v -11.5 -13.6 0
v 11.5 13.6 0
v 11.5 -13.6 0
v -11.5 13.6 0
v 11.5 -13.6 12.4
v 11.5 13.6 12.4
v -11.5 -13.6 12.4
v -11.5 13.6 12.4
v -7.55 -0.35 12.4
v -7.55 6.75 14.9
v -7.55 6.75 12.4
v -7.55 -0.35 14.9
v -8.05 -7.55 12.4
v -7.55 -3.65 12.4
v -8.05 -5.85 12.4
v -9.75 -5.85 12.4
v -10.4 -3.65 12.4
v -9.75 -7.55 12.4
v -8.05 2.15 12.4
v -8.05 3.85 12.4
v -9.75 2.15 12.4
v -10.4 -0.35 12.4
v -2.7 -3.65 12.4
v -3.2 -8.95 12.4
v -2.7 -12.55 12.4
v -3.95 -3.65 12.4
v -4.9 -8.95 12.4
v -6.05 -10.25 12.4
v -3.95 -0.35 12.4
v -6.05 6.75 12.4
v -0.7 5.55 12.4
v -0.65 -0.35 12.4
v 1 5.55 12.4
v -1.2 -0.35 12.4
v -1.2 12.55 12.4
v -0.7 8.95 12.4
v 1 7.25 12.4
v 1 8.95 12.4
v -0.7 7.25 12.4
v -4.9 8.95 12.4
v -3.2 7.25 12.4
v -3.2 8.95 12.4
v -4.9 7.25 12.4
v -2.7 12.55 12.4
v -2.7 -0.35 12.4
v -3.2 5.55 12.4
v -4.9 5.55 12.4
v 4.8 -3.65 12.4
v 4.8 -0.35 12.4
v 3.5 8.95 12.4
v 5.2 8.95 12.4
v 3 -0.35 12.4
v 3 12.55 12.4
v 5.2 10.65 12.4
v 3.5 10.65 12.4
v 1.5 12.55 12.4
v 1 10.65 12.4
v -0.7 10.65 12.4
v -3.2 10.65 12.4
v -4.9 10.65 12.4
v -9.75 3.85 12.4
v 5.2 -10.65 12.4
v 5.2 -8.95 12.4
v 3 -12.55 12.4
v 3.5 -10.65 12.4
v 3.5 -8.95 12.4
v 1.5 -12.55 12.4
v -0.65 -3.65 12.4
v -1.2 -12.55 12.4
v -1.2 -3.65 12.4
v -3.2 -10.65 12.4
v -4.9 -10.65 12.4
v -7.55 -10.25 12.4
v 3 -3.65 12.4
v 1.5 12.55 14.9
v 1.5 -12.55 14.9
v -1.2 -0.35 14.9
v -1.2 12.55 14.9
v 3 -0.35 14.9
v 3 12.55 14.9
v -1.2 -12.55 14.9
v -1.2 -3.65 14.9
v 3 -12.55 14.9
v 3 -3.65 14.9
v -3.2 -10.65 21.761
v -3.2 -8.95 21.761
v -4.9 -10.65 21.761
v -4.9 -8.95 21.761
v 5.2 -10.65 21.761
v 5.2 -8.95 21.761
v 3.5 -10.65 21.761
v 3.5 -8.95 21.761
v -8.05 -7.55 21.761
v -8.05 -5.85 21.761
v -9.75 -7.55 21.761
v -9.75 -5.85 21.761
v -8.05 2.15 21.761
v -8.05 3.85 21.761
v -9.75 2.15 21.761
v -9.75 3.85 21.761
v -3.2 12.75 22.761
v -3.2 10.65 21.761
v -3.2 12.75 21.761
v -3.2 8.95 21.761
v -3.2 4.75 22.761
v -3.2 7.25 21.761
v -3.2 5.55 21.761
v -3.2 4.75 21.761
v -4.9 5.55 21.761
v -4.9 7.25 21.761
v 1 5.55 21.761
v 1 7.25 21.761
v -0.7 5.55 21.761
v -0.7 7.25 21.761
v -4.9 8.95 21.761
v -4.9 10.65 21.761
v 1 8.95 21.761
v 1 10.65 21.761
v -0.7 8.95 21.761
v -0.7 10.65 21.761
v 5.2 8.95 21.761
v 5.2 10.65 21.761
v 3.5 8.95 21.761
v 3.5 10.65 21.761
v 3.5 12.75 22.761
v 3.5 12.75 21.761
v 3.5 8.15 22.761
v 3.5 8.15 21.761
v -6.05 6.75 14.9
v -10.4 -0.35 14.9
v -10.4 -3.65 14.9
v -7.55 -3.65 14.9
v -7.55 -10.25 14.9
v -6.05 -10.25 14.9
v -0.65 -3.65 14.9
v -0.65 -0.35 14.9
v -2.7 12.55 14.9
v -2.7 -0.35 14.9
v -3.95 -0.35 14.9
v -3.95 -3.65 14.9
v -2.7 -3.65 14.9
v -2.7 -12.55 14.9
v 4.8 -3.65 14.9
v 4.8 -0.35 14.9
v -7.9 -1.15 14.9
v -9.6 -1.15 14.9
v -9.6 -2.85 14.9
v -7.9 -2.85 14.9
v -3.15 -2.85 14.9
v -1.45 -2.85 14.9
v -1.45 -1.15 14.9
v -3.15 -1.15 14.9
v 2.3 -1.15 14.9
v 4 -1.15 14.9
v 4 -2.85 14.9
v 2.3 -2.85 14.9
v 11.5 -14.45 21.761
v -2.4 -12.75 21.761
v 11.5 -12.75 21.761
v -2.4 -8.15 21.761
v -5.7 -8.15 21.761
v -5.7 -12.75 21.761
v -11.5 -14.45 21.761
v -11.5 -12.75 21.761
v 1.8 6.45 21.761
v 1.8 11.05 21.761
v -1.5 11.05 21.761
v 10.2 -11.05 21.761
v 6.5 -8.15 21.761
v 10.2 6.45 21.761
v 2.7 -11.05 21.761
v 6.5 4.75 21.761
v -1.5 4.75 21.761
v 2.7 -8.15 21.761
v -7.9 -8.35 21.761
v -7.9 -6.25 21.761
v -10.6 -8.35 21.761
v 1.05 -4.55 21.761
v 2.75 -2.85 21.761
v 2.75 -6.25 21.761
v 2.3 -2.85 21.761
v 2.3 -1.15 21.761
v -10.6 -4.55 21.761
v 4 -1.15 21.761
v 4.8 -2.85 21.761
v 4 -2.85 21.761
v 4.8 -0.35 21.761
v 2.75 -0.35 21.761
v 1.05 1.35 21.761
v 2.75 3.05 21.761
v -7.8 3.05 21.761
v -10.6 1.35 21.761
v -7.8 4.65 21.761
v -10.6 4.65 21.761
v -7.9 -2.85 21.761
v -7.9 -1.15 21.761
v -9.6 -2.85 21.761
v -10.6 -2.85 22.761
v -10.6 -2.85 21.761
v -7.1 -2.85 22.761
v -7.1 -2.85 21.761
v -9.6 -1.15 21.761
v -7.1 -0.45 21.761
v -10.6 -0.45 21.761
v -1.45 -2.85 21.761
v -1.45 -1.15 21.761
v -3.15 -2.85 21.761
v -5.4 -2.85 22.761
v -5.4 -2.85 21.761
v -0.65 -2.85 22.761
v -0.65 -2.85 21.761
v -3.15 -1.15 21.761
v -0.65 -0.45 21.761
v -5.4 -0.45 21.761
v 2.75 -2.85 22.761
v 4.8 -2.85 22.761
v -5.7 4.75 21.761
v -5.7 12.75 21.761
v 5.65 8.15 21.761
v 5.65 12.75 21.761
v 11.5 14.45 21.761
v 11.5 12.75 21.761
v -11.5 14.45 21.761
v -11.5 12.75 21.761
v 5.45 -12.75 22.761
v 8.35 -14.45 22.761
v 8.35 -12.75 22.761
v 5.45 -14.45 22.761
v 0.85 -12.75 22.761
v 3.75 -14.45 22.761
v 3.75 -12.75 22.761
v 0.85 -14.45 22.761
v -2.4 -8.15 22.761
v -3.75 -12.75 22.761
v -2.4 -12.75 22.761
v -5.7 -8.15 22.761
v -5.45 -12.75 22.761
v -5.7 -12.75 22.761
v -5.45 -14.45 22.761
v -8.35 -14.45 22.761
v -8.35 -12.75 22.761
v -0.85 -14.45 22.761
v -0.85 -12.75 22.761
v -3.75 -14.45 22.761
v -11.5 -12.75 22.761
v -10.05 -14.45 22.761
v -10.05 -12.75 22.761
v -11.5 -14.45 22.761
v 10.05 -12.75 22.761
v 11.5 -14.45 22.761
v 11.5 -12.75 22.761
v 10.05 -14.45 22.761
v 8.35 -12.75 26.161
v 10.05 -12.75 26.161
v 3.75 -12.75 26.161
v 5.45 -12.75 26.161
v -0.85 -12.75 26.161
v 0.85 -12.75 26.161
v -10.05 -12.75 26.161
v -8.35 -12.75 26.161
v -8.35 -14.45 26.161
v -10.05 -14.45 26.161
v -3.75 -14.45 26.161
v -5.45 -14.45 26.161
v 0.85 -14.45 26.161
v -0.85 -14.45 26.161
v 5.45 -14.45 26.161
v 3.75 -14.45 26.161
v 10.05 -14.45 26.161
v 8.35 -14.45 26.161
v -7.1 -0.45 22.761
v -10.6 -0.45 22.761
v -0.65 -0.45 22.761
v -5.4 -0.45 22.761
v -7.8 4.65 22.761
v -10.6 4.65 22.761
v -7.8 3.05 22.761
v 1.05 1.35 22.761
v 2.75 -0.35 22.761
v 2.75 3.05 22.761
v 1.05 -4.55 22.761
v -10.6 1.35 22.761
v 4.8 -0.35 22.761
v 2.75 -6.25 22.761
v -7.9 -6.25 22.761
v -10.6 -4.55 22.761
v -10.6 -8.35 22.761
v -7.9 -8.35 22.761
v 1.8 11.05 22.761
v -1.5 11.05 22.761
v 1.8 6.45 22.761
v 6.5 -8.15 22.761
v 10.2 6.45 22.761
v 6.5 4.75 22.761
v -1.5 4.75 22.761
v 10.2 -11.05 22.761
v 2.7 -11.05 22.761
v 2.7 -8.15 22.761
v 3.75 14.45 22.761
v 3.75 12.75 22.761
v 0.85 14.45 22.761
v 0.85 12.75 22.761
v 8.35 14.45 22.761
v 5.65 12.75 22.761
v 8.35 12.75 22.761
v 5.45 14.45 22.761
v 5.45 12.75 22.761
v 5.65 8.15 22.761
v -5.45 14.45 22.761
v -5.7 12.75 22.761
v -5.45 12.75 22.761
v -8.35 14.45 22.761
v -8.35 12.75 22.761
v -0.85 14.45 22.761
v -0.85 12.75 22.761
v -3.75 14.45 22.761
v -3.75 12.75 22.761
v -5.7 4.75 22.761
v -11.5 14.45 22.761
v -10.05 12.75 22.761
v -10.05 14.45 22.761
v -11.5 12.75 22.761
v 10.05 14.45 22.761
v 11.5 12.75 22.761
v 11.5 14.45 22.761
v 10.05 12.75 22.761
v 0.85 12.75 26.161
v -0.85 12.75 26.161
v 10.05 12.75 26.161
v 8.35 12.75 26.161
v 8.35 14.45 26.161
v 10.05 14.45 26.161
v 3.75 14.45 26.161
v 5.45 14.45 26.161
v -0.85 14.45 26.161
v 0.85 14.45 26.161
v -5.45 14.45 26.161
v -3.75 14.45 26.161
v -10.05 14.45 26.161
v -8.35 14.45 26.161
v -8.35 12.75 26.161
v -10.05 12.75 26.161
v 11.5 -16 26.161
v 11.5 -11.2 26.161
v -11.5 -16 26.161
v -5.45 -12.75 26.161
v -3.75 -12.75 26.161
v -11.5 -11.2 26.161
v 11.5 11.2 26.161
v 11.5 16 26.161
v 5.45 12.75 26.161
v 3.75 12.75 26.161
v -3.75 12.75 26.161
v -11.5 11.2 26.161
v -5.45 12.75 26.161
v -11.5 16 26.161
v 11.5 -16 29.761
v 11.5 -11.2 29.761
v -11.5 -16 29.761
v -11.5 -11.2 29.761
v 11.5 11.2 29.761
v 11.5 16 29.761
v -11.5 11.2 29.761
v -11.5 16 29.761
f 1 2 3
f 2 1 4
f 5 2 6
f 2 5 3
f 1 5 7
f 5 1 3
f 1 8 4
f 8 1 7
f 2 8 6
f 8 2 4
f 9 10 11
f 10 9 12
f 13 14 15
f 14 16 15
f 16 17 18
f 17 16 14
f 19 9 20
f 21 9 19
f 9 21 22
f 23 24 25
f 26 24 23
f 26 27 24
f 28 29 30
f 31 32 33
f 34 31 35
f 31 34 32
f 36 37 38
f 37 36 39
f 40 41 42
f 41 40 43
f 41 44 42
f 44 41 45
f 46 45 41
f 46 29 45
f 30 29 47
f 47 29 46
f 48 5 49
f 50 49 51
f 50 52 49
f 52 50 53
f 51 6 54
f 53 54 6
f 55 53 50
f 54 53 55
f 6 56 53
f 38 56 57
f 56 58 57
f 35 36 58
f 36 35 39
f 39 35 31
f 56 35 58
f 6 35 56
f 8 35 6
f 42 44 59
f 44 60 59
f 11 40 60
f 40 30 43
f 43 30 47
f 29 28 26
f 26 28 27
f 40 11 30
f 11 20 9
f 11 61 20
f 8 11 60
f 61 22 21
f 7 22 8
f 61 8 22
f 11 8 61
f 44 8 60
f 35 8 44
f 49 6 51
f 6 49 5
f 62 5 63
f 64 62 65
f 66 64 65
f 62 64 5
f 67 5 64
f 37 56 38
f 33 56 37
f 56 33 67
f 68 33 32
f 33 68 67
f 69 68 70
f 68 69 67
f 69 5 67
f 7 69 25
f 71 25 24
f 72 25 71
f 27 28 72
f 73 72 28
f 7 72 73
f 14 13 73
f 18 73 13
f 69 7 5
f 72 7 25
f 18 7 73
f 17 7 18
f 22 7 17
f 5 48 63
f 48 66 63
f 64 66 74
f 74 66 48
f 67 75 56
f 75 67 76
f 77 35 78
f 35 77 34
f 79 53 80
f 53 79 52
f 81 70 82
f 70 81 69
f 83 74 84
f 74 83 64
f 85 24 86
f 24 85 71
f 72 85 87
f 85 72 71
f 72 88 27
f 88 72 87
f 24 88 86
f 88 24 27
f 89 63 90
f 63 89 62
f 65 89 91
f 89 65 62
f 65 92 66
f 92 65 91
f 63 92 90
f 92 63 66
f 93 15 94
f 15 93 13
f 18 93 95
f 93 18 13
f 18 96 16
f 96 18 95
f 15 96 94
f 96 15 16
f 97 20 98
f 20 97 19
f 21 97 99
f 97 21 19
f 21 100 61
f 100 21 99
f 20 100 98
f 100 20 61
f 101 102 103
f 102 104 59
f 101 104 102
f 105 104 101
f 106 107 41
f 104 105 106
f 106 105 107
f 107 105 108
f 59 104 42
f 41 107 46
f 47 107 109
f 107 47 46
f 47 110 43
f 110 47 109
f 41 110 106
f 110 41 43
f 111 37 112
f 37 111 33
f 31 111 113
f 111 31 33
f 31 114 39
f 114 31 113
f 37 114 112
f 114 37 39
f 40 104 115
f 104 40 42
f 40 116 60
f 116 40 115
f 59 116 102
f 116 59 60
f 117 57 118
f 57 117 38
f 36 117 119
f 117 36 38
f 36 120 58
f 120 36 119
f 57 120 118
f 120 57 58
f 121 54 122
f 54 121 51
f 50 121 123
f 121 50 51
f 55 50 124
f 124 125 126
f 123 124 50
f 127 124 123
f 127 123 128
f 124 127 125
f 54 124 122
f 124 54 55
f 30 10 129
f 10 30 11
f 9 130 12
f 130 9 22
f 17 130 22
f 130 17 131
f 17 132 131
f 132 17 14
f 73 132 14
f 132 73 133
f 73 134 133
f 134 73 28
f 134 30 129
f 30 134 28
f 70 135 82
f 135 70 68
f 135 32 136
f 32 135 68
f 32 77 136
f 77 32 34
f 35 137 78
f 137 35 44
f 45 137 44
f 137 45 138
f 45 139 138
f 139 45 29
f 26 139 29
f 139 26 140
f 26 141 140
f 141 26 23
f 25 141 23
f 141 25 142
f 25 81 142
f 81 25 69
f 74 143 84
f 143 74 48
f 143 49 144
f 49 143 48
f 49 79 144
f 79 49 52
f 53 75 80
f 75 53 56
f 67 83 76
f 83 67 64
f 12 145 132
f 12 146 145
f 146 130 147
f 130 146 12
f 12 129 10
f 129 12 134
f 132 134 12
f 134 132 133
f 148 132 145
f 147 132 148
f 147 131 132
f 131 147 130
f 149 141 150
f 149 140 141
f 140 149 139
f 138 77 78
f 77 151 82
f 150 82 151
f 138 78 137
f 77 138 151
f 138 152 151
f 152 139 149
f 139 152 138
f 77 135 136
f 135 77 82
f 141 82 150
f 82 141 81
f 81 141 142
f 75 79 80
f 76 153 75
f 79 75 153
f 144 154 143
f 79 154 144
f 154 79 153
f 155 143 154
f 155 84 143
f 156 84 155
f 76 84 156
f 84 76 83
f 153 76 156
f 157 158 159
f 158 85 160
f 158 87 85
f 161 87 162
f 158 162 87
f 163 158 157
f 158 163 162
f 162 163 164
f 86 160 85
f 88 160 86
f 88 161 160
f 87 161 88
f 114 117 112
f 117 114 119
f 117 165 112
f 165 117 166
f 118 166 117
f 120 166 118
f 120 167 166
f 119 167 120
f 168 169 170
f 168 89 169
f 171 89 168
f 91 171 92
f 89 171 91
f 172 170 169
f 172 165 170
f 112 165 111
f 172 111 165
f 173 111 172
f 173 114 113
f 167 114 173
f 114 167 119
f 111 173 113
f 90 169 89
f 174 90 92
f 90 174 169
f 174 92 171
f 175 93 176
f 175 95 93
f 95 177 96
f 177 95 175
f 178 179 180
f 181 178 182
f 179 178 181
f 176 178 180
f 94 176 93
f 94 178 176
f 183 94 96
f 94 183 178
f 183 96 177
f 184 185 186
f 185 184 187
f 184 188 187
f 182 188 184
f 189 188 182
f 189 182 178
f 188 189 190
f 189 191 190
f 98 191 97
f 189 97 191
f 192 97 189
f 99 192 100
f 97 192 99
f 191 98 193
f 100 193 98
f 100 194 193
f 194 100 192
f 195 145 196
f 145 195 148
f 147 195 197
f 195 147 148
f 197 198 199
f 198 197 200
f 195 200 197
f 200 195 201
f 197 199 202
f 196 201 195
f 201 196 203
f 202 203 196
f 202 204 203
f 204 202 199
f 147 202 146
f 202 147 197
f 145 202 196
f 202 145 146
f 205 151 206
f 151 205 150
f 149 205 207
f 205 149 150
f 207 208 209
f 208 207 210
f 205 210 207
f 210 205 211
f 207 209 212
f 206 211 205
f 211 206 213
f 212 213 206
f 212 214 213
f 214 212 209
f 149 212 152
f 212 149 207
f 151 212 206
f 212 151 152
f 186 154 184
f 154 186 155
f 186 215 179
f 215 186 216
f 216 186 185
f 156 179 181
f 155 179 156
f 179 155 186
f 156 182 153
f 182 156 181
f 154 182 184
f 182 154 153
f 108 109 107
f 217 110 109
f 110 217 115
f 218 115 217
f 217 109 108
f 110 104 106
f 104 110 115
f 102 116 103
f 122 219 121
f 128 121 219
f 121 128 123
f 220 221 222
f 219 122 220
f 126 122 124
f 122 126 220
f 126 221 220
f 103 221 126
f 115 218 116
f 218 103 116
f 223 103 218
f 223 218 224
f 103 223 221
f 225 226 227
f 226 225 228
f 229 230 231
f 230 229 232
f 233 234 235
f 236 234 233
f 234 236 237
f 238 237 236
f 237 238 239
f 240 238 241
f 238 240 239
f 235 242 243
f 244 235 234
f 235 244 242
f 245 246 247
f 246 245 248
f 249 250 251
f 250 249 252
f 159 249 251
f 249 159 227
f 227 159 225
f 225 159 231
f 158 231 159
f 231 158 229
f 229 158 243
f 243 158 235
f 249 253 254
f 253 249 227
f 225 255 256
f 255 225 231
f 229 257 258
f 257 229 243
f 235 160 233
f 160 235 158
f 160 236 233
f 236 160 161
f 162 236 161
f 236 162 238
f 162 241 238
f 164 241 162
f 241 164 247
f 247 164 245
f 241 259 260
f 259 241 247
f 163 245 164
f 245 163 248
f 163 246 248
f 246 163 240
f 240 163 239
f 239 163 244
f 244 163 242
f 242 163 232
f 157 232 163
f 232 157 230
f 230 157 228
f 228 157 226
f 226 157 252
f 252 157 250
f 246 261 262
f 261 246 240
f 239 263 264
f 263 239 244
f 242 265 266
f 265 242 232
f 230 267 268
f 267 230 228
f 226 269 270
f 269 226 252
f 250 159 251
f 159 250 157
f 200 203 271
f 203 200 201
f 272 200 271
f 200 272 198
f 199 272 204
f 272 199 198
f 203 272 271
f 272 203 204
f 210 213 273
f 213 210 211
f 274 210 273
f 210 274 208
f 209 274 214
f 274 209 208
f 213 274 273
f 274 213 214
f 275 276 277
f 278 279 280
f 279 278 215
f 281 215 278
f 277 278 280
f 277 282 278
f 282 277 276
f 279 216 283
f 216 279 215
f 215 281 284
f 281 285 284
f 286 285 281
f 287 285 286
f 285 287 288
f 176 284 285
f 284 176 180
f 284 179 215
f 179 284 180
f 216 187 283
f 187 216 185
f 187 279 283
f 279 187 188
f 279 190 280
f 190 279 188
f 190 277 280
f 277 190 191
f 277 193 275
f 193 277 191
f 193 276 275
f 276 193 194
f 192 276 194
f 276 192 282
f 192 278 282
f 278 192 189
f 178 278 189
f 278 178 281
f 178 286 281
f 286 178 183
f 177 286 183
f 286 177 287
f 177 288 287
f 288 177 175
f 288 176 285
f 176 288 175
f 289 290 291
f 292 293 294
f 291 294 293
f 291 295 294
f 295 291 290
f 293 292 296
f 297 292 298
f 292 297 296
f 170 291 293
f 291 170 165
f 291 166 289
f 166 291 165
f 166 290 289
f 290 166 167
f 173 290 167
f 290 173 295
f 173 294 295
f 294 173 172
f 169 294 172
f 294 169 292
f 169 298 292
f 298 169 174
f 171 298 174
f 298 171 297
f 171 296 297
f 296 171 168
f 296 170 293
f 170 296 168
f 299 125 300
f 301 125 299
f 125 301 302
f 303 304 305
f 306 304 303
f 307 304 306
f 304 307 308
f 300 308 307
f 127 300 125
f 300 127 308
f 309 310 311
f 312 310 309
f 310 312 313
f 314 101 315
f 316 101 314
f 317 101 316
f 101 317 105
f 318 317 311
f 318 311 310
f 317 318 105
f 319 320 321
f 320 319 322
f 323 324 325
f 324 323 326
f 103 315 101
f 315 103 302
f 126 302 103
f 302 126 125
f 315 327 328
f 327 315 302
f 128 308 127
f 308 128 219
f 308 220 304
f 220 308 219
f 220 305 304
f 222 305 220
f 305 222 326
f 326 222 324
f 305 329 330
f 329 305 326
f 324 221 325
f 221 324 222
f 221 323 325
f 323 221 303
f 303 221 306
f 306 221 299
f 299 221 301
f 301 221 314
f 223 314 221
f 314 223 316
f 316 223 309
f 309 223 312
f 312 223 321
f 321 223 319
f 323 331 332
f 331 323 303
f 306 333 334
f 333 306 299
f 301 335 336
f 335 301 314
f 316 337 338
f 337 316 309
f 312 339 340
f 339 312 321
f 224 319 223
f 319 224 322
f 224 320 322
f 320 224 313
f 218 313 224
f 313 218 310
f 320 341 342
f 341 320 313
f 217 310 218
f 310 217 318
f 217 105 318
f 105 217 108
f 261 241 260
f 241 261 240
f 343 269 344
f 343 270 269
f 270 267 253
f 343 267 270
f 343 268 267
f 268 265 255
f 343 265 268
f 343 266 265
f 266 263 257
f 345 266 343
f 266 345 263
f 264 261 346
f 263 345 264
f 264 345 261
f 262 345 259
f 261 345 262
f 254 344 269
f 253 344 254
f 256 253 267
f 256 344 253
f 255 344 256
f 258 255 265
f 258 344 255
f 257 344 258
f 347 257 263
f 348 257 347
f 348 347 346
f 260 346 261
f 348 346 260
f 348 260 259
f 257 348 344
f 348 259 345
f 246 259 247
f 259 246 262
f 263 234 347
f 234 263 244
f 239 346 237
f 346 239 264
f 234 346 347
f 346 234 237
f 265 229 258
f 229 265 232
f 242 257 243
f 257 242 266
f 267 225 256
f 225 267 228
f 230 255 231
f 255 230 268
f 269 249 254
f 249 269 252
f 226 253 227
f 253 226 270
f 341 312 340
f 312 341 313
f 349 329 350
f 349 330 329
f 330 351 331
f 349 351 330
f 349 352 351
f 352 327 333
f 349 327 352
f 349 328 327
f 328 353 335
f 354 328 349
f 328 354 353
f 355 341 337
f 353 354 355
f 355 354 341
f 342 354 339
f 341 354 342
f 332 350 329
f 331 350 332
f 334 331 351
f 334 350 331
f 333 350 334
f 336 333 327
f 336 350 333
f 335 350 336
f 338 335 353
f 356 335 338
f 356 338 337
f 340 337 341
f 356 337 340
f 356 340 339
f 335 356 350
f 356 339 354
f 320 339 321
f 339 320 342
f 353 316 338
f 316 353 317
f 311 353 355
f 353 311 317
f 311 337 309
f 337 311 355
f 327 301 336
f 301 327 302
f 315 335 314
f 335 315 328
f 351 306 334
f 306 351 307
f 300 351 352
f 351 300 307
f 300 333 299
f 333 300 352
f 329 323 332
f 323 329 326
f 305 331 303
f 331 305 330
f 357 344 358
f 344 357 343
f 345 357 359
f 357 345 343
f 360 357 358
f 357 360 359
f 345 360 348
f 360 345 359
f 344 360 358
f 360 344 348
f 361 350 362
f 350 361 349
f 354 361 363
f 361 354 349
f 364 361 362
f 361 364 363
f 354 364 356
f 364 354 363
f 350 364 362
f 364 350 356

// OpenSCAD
// Generated by SolidPython 0.4.2 on 2020-09-29 23:21:20
//!OpenSCAD

scale(v = 0.0100000000) {
	translate(v = [-1150, -1360, 0]) {
		union() {
			color(c = [0.4000000000, 0.4000000000, 0.4000000000]) {
				translate(v = [0, 0, 0]) {
					linear_extrude(height = 1000.0000000000) {
						polygon(paths = [[0, 1, 2, 3]], points = [[0, 0], [0, 2720], [2300, 2720], [2300, 0]]);
					}
				}
			}
			color(c = [0.2000000000, 0.6000000000, 0.2000000000]) {
				translate(v = [0, 0, 1000.0000000000]) {
					linear_extrude(height = 120.0000000000) {
						polygon(paths = [[0, 1, 2, 3]], points = [[0, 1305], [0, 2720], [2300, 2720], [2300, 1305]]);
					}
				}
			}
			color(c = [0.4000000000, 0.4000000000, 0.4000000000]) {
				translate(v = [0, 0, 1000.0000000000]) {
					linear_extrude(height = 120.0000000000) {
						polygon(paths = [[0, 1, 2, 3]], points = [[0, 0], [0, 1305], [2300, 1305], [2300, 0]]);
					}
				}
			}
			color(c = [0.9000000000, 0.6000000000, 0.6000000000]) {
				translate(v = [0, 0, 1120.0000000000]) {
					linear_extrude(height = 120.0000000000) {
						polygon(paths = [[0, 1, 2, 3]], points = [[135, 1485], [135, 1905], [395, 1905], [395, 1485]]);
					}
				}
			}
			color(c = [0.9000000000, 0.6000000000, 0.6000000000]) {
				translate(v = [0, 0, 1120.0000000000]) {
					linear_extrude(height = 120.0000000000) {
						polygon(paths = [[0, 1, 2, 3, 4, 5]], points = [[545, 1485], [545, 1905], [620, 1905], [620, 2485], [880, 2485], [880, 1485]]);
					}
				}
			}
			color(c = [0.9000000000, 0.6000000000, 0.6000000000]) {
				translate(v = [0, 0, 1120.0000000000]) {
					linear_extrude(height = 120.0000000000) {
						polygon(paths = [[0, 1, 2, 3]], points = [[1030, 1485], [1030, 2485], [1300, 2485], [1300, 1485]]);
					}
				}
			}
			color(c = [0.9000000000, 0.6000000000, 0.6000000000]) {
				translate(v = [0, 0, 1120.0000000000]) {
					linear_extrude(height = 120.0000000000) {
						polygon(paths = [[0, 1, 2, 3]], points = [[1450, 1485], [1450, 2485], [1715, 2485], [1715, 1485]]);
					}
				}
			}
			color(c = [0.9000000000, 0.6000000000, 0.9000000000]) {
				translate(v = [0, 0, 1120.0000000000]) {
					linear_extrude(height = 120.0000000000) {
						polygon(paths = [[0, 1, 2, 3]], points = [[135, 465], [135, 885], [395, 885], [395, 465]]);
					}
				}
			}
			color(c = [0.9000000000, 0.6000000000, 0.9000000000]) {
				translate(v = [0, 0, 1120.0000000000]) {
					linear_extrude(height = 120.0000000000) {
						polygon(paths = [[0, 1, 2, 3, 4, 5]], points = [[620, 235], [620, 465], [545, 465], [545, 885], [880, 885], [880, 235]]);
					}
				}
			}
			color(c = [0.9000000000, 0.6000000000, 0.9000000000]) {
				translate(v = [0, 0, 1120.0000000000]) {
					linear_extrude(height = 120.0000000000) {
						polygon(paths = [[0, 1, 2, 3]], points = [[1030, 235], [1030, 885], [1300, 885], [1300, 235]]);
					}
				}
			}
			color(c = [0.9000000000, 0.6000000000, 0.9000000000]) {
				translate(v = [0, 0, 1120.0000000000]) {
					linear_extrude(height = 120.0000000000) {
						polygon(paths = [[0, 1, 2, 3]], points = [[1450, 235], [1450, 885], [1710, 885], [1710, 235]]);
					}
				}
			}
			color(c = [0.2000000000, 0.6000000000, 0.2000000000]) {
				translate(v = [0, 0, 1120.0000000000]) {
					linear_extrude(height = 120.0000000000) {
						difference() {
							polygon(paths = [[0, 1, 2, 3]], points = [[0, 1305], [0, 2720], [2300, 2720], [2300, 1305]]);
							polygon(paths = [[0, 1, 2, 3]], points = [[135, 1485], [395, 1485], [395, 1905], [135, 1905]]);
							polygon(paths = [[0, 1, 2, 3]], points = [[1030, 1485], [1300, 1485], [1300, 2485], [1030, 2485]]);
							polygon(paths = [[0, 1, 2, 3]], points = [[1450, 1485], [1715, 1485], [1715, 2485], [1450, 2485]]);
							polygon(paths = [[0, 1, 2, 3, 4, 5]], points = [[545, 1485], [880, 1485], [880, 2485], [620, 2485], [620, 1905], [545, 1905]]);
						}
					}
				}
			}
			color(c = [0.4000000000, 0.4000000000, 0.4000000000]) {
				translate(v = [0, 0, 1120.0000000000]) {
					linear_extrude(height = 120.0000000000) {
						difference() {
							polygon(paths = [[0, 1, 2, 3]], points = [[0, 0], [0, 1305], [2300, 1305], [2300, 0]]);
							polygon(paths = [[0, 1, 2, 3]], points = [[1030, 235], [1300, 235], [1300, 885], [1030, 885]]);
							polygon(paths = [[0, 1, 2, 3]], points = [[1450, 235], [1710, 235], [1710, 885], [1450, 885]]);
							polygon(paths = [[0, 1, 2, 3]], points = [[135, 465], [395, 465], [395, 885], [135, 885]]);
							polygon(paths = [[0, 1, 2, 3, 4, 5]], points = [[620, 235], [880, 235], [880, 885], [545, 885], [545, 465], [620, 465]]);
						}
					}
				}
			}
			color(c = [0.1000000000, 0.1000000000, 0.1000000000]) {
				translate(v = [0, 0, 1240.0000000000]) {
					linear_extrude(height = 70.0000000000) {
						polygon(paths = [[0, 1, 2, 3]], points = [[660, 295], [660, 465], [830, 465], [830, 295]]);
					}
				}
			}
			color(c = [0.1000000000, 0.1000000000, 0.1000000000]) {
				translate(v = [0, 0, 1240.0000000000]) {
					linear_extrude(height = 70.0000000000) {
						polygon(paths = [[0, 1, 2, 3]], points = [[1500, 295], [1500, 465], [1670, 465], [1670, 295]]);
					}
				}
			}
			color(c = [0.1000000000, 0.1000000000, 0.1000000000]) {
				translate(v = [0, 0, 1240.0000000000]) {
					linear_extrude(height = 70.0000000000) {
						polygon(paths = [[0, 1, 2, 3]], points = [[175, 605], [175, 775], [345, 775], [345, 605]]);
					}
				}
			}
			color(c = [0.1000000000, 0.1000000000, 0.1000000000]) {
				translate(v = [0, 0, 1240.0000000000]) {
					linear_extrude(height = 70.0000000000) {
						polygon(paths = [[0, 1, 2, 3]], points = [[175, 1575], [175, 1745], [345, 1745], [345, 1575]]);
					}
				}
			}
			color(c = [0.1000000000, 0.1000000000, 0.1000000000]) {
				translate(v = [0, 0, 1240.0000000000]) {
					linear_extrude(height = 70.0000000000) {
						polygon(paths = [[0, 1, 2, 3]], points = [[660, 1915], [660, 2085], [830, 2085], [830, 1915]]);
					}
				}
			}
			color(c = [0.1000000000, 0.1000000000, 0.1000000000]) {
				translate(v = [0, 0, 1240.0000000000]) {
					linear_extrude(height = 70.0000000000) {
						polygon(paths = [[0, 1, 2, 3]], points = [[1080, 1915], [1080, 2085], [1250, 2085], [1250, 1915]]);
					}
				}
			}
			color(c = [0.1000000000, 0.1000000000, 0.1000000000]) {
				translate(v = [0, 0, 1240.0000000000]) {
					linear_extrude(height = 70.0000000000) {
						polygon(paths = [[0, 1, 2, 3]], points = [[660, 2255], [660, 2425], [830, 2425], [830, 2255]]);
					}
				}
			}
			color(c = [0.1000000000, 0.1000000000, 0.1000000000]) {
				translate(v = [0, 0, 1240.0000000000]) {
					linear_extrude(height = 70.0000000000) {
						polygon(paths = [[0, 1, 2, 3]], points = [[1080, 2255], [1080, 2425], [1250, 2425], [1250, 2255]]);
					}
				}
			}
			color(c = [0.1000000000, 0.1000000000, 0.1000000000]) {
				translate(v = [0, 0, 1240.0000000000]) {
					linear_extrude(height = 70.0000000000) {
						polygon(paths = [[0, 1, 2, 3]], points = [[1500, 2255], [1500, 2425], [1670, 2425], [1670, 2255]]);
					}
				}
			}
			color(c = [1.0000000000, 1.0000000000, 1.0000000000]) {
				translate(v = [0, 0, 1240.0000000000]) {
					linear_extrude(height = 70.0000000000) {
						polygon(paths = [[0, 1, 2, 3, 4, 5, 6, 7]], points = [[395, 335], [395, 995], [110, 995], [110, 1325], [395, 1325], [395, 2035], [545, 2035], [545, 335]]);
					}
				}
			}
			color(c = [1.0000000000, 1.0000000000, 1.0000000000]) {
				translate(v = [0, 0, 1240.0000000000]) {
					linear_extrude(height = 70.0000000000) {
						polygon(paths = [[0, 1, 2, 3, 4, 5, 6, 7, 8, 9, 10, 11]], points = [[880, 105], [880, 995], [755, 995], [755, 1325], [880, 1325], [880, 2615], [1030, 2615], [1030, 1325], [1085, 1325], [1085, 995], [1030, 995], [1030, 105]]);
					}
				}
			}
			color(c = [1.0000000000, 1.0000000000, 1.0000000000]) {
				translate(v = [0, 0, 1240.0000000000]) {
					linear_extrude(height = 70.0000000000) {
						polygon(paths = [[0, 1, 2, 3, 4, 5, 6, 7]], points = [[1300, 105], [1300, 2615], [1450, 2615], [1450, 1325], [1630, 1325], [1630, 995], [1450, 995], [1450, 105]]);
					}
				}
			}
			color(c = [0.1000000000, 0.1000000000, 0.1000000000]) {
				translate(v = [0, 0, 1310.0000000000]) {
					linear_extrude(height = 180.0000000000) {
						polygon(paths = [[0, 1, 2, 3]], points = [[660, 295], [660, 465], [830, 465], [830, 295]]);
					}
				}
			}
			color(c = [0.1000000000, 0.1000000000, 0.1000000000]) {
				translate(v = [0, 0, 1310.0000000000]) {
					linear_extrude(height = 180.0000000000) {
						polygon(paths = [[0, 1, 2, 3]], points = [[1500, 295], [1500, 465], [1670, 465], [1670, 295]]);
					}
				}
			}
			color(c = [0.1000000000, 0.1000000000, 0.1000000000]) {
				translate(v = [0, 0, 1310.0000000000]) {
					linear_extrude(height = 180.0000000000) {
						polygon(paths = [[0, 1, 2, 3]], points = [[175, 605], [175, 775], [345, 775], [345, 605]]);
					}
				}
			}
			color(c = [0.1000000000, 0.1000000000, 0.1000000000]) {
				translate(v = [0, 0, 1310.0000000000]) {
					linear_extrude(height = 180.0000000000) {
						polygon(paths = [[0, 1, 2, 3]], points = [[175, 1575], [175, 1745], [345, 1745], [345, 1575]]);
					}
				}
			}
			color(c = [0.1000000000, 0.1000000000, 0.1000000000]) {
				translate(v = [0, 0, 1310.0000000000]) {
					linear_extrude(height = 180.0000000000) {
						polygon(paths = [[0, 1, 2, 3]], points = [[660, 1915], [660, 2085], [830, 2085], [830, 1915]]);
					}
				}
			}
			color(c = [0.1000000000, 0.1000000000, 0.1000000000]) {
				translate(v = [0, 0, 1310.0000000000]) {
					linear_extrude(height = 180.0000000000) {
						polygon(paths = [[0, 1, 2, 3]], points = [[1080, 1915], [1080, 2085], [1250, 2085], [1250, 1915]]);
					}
				}
			}
			color(c = [0.1000000000, 0.1000000000, 0.1000000000]) {
				translate(v = [0, 0, 1310.0000000000]) {
					linear_extrude(height = 180.0000000000) {
						polygon(paths = [[0, 1, 2, 3]], points = [[660, 2255], [660, 2425], [830, 2425], [830, 2255]]);
					}
				}
			}
			color(c = [0.1000000000, 0.1000000000, 0.1000000000]) {
				translate(v = [0, 0, 1310.0000000000]) {
					linear_extrude(height = 180.0000000000) {
						polygon(paths = [[0, 1, 2, 3]], points = [[1080, 2255], [1080, 2425], [1250, 2425], [1250, 2255]]);
					}
				}
			}
			color(c = [0.1000000000, 0.1000000000, 0.1000000000]) {
				translate(v = [0, 0, 1310.0000000000]) {
					linear_extrude(height = 180.0000000000) {
						polygon(paths = [[0, 1, 2, 3]], points = [[1500, 2255], [1500, 2425], [1670, 2425], [1670, 2255]]);
					}
				}
			}
			color(c = [0.7000000000, 0, 0]) {
				translate(v = [0, 0, 1310.0000000000]) {
					linear_extrude(height = 180.0000000000) {
						polygon(paths = [[0, 1, 2, 3, 4, 5, 6, 7]], points = [[395, 335], [395, 995], [110, 995], [110, 1325], [395, 1325], [395, 2035], [545, 2035], [545, 335]]);
					}
				}
			}
			color(c = [0.7000000000, 0, 0]) {
				translate(v = [0, 0, 1310.0000000000]) {
					linear_extrude(height = 180.0000000000) {
						polygon(paths = [[0, 1, 2, 3, 4, 5, 6, 7, 8, 9, 10, 11]], points = [[880, 105], [880, 995], [755, 995], [755, 1325], [880, 1325], [880, 2615], [1030, 2615], [1030, 1325], [1085, 1325], [1085, 995], [1030, 995], [1030, 105]]);
					}
				}
			}
			color(c = [0.7000000000, 0, 0]) {
				translate(v = [0, 0, 1310.0000000000]) {
					linear_extrude(height = 180.0000000000) {
						polygon(paths = [[0, 1, 2, 3, 4, 5, 6, 7]], points = [[1300, 105], [1300, 2615], [1450, 2615], [1450, 1325], [1630, 1325], [1630, 995], [1450, 995], [1450, 105]]);
					}
				}
			}
			color(c = [0.1000000000, 0.1000000000, 0.1000000000]) {
				translate(v = [0, 0, 1490.0000000000]) {
					linear_extrude(height = 686.1000000000) {
						polygon(paths = [[0, 1, 2, 3]], points = [[660, 295], [660, 465], [830, 465], [830, 295]]);
					}
				}
			}
			color(c = [0.1000000000, 0.1000000000, 0.1000000000]) {
				translate(v = [0, 0, 1490.0000000000]) {
					linear_extrude(height = 686.1000000000) {
						polygon(paths = [[0, 1, 2, 3]], points = [[1500, 295], [1500, 465], [1670, 465], [1670, 295]]);
					}
				}
			}
			color(c = [0.1000000000, 0.1000000000, 0.1000000000]) {
				translate(v = [0, 0, 1490.0000000000]) {
					linear_extrude(height = 686.1000000000) {
						polygon(paths = [[0, 1, 2, 3]], points = [[175, 605], [175, 775], [345, 775], [345, 605]]);
					}
				}
			}
			color(c = [0.1000000000, 0.1000000000, 0.1000000000]) {
				translate(v = [0, 0, 1490.0000000000]) {
					linear_extrude(height = 686.1000000000) {
						polygon(paths = [[0, 1, 2, 3]], points = [[190, 1075], [190, 1245], [360, 1245], [360, 1075]]);
					}
				}
			}
			color(c = [0.1000000000, 0.1000000000, 0.1000000000]) {
				translate(v = [0, 0, 1490.0000000000]) {
					linear_extrude(height = 686.1000000000) {
						polygon(paths = [[0, 1, 2, 3]], points = [[835, 1075], [835, 1245], [1005, 1245], [1005, 1075]]);
					}
				}
			}
			color(c = [0.1000000000, 0.1000000000, 0.1000000000]) {
				translate(v = [0, 0, 1490.0000000000]) {
					linear_extrude(height = 686.1000000000) {
						polygon(paths = [[0, 1, 2, 3]], points = [[1380, 1075], [1380, 1245], [1550, 1245], [1550, 1075]]);
					}
				}
			}
			color(c = [0.1000000000, 0.1000000000, 0.1000000000]) {
				translate(v = [0, 0, 1490.0000000000]) {
					linear_extrude(height = 686.1000000000) {
						polygon(paths = [[0, 1, 2, 3]], points = [[175, 1575], [175, 1745], [345, 1745], [345, 1575]]);
					}
				}
			}
			color(c = [0.1000000000, 0.1000000000, 0.1000000000]) {
				translate(v = [0, 0, 1490.0000000000]) {
					linear_extrude(height = 686.1000000000) {
						polygon(paths = [[0, 1, 2, 3]], points = [[660, 1915], [660, 2085], [830, 2085], [830, 1915]]);
					}
				}
			}
			color(c = [0.1000000000, 0.1000000000, 0.1000000000]) {
				translate(v = [0, 0, 1490.0000000000]) {
					linear_extrude(height = 686.1000000000) {
						polygon(paths = [[0, 1, 2, 3]], points = [[1080, 1915], [1080, 2085], [1250, 2085], [1250, 1915]]);
					}
				}
			}
			color(c = [0.1000000000, 0.1000000000, 0.1000000000]) {
				translate(v = [0, 0, 1490.0000000000]) {
					linear_extrude(height = 686.1000000000) {
						polygon(paths = [[0, 1, 2, 3]], points = [[660, 2255], [660, 2425], [830, 2425], [830, 2255]]);
					}
				}
			}
			color(c = [0.1000000000, 0.1000000000, 0.1000000000]) {
				translate(v = [0, 0, 1490.0000000000]) {
					linear_extrude(height = 686.1000000000) {
						polygon(paths = [[0, 1, 2, 3]], points = [[1080, 2255], [1080, 2425], [1250, 2425], [1250, 2255]]);
					}
				}
			}
			color(c = [0.1000000000, 0.1000000000, 0.1000000000]) {
				translate(v = [0, 0, 1490.0000000000]) {
					linear_extrude(height = 686.1000000000) {
						polygon(paths = [[0, 1, 2, 3]], points = [[1500, 2255], [1500, 2425], [1670, 2425], [1670, 2255]]);
					}
				}
			}
			color(c = [0.9000000000, 0.6000000000, 0.6000000000]) {
				translate(v = [0, 0, 2176.1000000000]) {
					linear_extrude(height = 100.0000000000) {
						polygon(paths = [[0, 1, 2, 3, 4, 5, 6, 7]], points = [[0, -85], [0, 85], [580, 85], [580, 545], [910, 545], [910, 85], [2300, 85], [2300, -85]]);
					}
				}
			}
			color(c = [0.9000000000, 0.6000000000, 0.6000000000]) {
				translate(v = [0, 0, 2176.1000000000]) {
					linear_extrude(height = 100.0000000000) {
						polygon(paths = [[0, 1, 2, 3]], points = [[90, 1075], [90, 1315], [440, 1315], [440, 1075]]);
					}
				}
			}
			color(c = [0.9000000000, 0.6000000000, 0.6000000000]) {
				translate(v = [0, 0, 2176.1000000000]) {
					linear_extrude(height = 100.0000000000) {
						polygon(paths = [[0, 1, 2, 3]], points = [[610, 1075], [610, 1315], [1085, 1315], [1085, 1075]]);
					}
				}
			}
			color(c = [0.9000000000, 0.6000000000, 0.6000000000]) {
				translate(v = [0, 0, 2176.1000000000]) {
					linear_extrude(height = 100.0000000000) {
						polygon(paths = [[0, 1, 2, 3, 4, 5, 6, 7, 8, 9, 10, 11, 12, 13, 14, 15]], points = [[90, 525], [90, 905], [1255, 905], [1255, 1495], [90, 1495], [90, 1825], [370, 1825], [370, 1665], [1425, 1665], [1425, 1325], [1630, 1325], [1630, 1075], [1425, 1075], [1425, 735], [360, 735], [360, 525]]);
					}
				}
			}
			color(c = [0.9000000000, 0.6000000000, 0.6000000000]) {
				translate(v = [0, 0, 2176.1000000000]) {
					linear_extrude(height = 100.0000000000) {
						polygon(paths = [[0, 1, 2, 3, 4, 5, 6, 7, 8, 9]], points = [[1420, 255], [1420, 545], [1800, 545], [1800, 1835], [1000, 1835], [1000, 2465], [1330, 2465], [1330, 2005], [2170, 2005], [2170, 255]]);
					}
				}
			}
			color(c = [0.9000000000, 0.6000000000, 0.6000000000]) {
				translate(v = [0, 0, 2176.1000000000]) {
					linear_extrude(height = 100.0000000000) {
						polygon(paths = [[0, 1, 2, 3, 4, 5, 6, 7, 8, 9, 10, 11]], points = [[580, 1835], [580, 2635], [0, 2635], [0, 2805], [2300, 2805], [2300, 2635], [1715, 2635], [1715, 2175], [1500, 2175], [1500, 2635], [830, 2635], [830, 1835]]);
					}
				}
			}
			color(c = [0.5000000000, 0.5000000000, 0.5000000000]) {
				translate(v = [0, 0, 2276.1000000000]) {
					linear_extrude(height = 340.0000000000) {
						polygon(paths = [[0, 1, 2, 3]], points = [[145, -85], [145, 85], [315, 85], [315, -85]]);
					}
				}
			}
			color(c = [0.5000000000, 0.5000000000, 0.5000000000]) {
				translate(v = [0, 0, 2276.1000000000]) {
					linear_extrude(height = 340.0000000000) {
						polygon(paths = [[0, 1, 2, 3]], points = [[605, -85], [605, 85], [775, 85], [775, -85]]);
					}
				}
			}
			color(c = [0.5000000000, 0.5000000000, 0.5000000000]) {
				translate(v = [0, 0, 2276.1000000000]) {
					linear_extrude(height = 340.0000000000) {
						polygon(paths = [[0, 1, 2, 3]], points = [[1065, -85], [1065, 85], [1235, 85], [1235, -85]]);
					}
				}
			}
			color(c = [0.5000000000, 0.5000000000, 0.5000000000]) {
				translate(v = [0, 0, 2276.1000000000]) {
					linear_extrude(height = 340.0000000000) {
						polygon(paths = [[0, 1, 2, 3]], points = [[1525, -85], [1525, 85], [1695, 85], [1695, -85]]);
					}
				}
			}
			color(c = [0.5000000000, 0.5000000000, 0.5000000000]) {
				translate(v = [0, 0, 2276.1000000000]) {
					linear_extrude(height = 340.0000000000) {
						polygon(paths = [[0, 1, 2, 3]], points = [[1985, -85], [1985, 85], [2155, 85], [2155, -85]]);
					}
				}
			}
			color(c = [0.5000000000, 0.5000000000, 0.5000000000]) {
				translate(v = [0, 0, 2276.1000000000]) {
					linear_extrude(height = 340.0000000000) {
						polygon(paths = [[0, 1, 2, 3]], points = [[145, 2635], [145, 2805], [315, 2805], [315, 2635]]);
					}
				}
			}
			color(c = [0.5000000000, 0.5000000000, 0.5000000000]) {
				translate(v = [0, 0, 2276.1000000000]) {
					linear_extrude(height = 340.0000000000) {
						polygon(paths = [[0, 1, 2, 3]], points = [[605, 2635], [605, 2805], [775, 2805], [775, 2635]]);
					}
				}
			}
			color(c = [0.5000000000, 0.5000000000, 0.5000000000]) {
				translate(v = [0, 0, 2276.1000000000]) {
					linear_extrude(height = 340.0000000000) {
						polygon(paths = [[0, 1, 2, 3]], points = [[1065, 2635], [1065, 2805], [1235, 2805], [1235, 2635]]);
					}
				}
			}
			color(c = [0.5000000000, 0.5000000000, 0.5000000000]) {
				translate(v = [0, 0, 2276.1000000000]) {
					linear_extrude(height = 340.0000000000) {
						polygon(paths = [[0, 1, 2, 3]], points = [[1525, 2635], [1525, 2805], [1695, 2805], [1695, 2635]]);
					}
				}
			}
			color(c = [0.5000000000, 0.5000000000, 0.5000000000]) {
				translate(v = [0, 0, 2276.1000000000]) {
					linear_extrude(height = 340.0000000000) {
						polygon(paths = [[0, 1, 2, 3]], points = [[1985, 2635], [1985, 2805], [2155, 2805], [2155, 2635]]);
					}
				}
			}
			color(c = [0.3000000000, 0.3000000000, 1]) {
				translate(v = [0, 0, 2616.1000000000]) {
					linear_extrude(height = 360.0000000000) {
						polygon(paths = [[0, 1, 2, 3]], points = [[0, -240], [0, 240], [2300, 240], [2300, -240]]);
					}
				}
			}
			color(c = [0.3000000000, 0.3000000000, 1]) {
				translate(v = [0, 0, 2616.1000000000]) {
					linear_extrude(height = 360.0000000000) {
						polygon(paths = [[0, 1, 2, 3]], points = [[0, 2480], [0, 2960], [2300, 2960], [2300, 2480]]);
					}
				}
			}
		}
	}
}
